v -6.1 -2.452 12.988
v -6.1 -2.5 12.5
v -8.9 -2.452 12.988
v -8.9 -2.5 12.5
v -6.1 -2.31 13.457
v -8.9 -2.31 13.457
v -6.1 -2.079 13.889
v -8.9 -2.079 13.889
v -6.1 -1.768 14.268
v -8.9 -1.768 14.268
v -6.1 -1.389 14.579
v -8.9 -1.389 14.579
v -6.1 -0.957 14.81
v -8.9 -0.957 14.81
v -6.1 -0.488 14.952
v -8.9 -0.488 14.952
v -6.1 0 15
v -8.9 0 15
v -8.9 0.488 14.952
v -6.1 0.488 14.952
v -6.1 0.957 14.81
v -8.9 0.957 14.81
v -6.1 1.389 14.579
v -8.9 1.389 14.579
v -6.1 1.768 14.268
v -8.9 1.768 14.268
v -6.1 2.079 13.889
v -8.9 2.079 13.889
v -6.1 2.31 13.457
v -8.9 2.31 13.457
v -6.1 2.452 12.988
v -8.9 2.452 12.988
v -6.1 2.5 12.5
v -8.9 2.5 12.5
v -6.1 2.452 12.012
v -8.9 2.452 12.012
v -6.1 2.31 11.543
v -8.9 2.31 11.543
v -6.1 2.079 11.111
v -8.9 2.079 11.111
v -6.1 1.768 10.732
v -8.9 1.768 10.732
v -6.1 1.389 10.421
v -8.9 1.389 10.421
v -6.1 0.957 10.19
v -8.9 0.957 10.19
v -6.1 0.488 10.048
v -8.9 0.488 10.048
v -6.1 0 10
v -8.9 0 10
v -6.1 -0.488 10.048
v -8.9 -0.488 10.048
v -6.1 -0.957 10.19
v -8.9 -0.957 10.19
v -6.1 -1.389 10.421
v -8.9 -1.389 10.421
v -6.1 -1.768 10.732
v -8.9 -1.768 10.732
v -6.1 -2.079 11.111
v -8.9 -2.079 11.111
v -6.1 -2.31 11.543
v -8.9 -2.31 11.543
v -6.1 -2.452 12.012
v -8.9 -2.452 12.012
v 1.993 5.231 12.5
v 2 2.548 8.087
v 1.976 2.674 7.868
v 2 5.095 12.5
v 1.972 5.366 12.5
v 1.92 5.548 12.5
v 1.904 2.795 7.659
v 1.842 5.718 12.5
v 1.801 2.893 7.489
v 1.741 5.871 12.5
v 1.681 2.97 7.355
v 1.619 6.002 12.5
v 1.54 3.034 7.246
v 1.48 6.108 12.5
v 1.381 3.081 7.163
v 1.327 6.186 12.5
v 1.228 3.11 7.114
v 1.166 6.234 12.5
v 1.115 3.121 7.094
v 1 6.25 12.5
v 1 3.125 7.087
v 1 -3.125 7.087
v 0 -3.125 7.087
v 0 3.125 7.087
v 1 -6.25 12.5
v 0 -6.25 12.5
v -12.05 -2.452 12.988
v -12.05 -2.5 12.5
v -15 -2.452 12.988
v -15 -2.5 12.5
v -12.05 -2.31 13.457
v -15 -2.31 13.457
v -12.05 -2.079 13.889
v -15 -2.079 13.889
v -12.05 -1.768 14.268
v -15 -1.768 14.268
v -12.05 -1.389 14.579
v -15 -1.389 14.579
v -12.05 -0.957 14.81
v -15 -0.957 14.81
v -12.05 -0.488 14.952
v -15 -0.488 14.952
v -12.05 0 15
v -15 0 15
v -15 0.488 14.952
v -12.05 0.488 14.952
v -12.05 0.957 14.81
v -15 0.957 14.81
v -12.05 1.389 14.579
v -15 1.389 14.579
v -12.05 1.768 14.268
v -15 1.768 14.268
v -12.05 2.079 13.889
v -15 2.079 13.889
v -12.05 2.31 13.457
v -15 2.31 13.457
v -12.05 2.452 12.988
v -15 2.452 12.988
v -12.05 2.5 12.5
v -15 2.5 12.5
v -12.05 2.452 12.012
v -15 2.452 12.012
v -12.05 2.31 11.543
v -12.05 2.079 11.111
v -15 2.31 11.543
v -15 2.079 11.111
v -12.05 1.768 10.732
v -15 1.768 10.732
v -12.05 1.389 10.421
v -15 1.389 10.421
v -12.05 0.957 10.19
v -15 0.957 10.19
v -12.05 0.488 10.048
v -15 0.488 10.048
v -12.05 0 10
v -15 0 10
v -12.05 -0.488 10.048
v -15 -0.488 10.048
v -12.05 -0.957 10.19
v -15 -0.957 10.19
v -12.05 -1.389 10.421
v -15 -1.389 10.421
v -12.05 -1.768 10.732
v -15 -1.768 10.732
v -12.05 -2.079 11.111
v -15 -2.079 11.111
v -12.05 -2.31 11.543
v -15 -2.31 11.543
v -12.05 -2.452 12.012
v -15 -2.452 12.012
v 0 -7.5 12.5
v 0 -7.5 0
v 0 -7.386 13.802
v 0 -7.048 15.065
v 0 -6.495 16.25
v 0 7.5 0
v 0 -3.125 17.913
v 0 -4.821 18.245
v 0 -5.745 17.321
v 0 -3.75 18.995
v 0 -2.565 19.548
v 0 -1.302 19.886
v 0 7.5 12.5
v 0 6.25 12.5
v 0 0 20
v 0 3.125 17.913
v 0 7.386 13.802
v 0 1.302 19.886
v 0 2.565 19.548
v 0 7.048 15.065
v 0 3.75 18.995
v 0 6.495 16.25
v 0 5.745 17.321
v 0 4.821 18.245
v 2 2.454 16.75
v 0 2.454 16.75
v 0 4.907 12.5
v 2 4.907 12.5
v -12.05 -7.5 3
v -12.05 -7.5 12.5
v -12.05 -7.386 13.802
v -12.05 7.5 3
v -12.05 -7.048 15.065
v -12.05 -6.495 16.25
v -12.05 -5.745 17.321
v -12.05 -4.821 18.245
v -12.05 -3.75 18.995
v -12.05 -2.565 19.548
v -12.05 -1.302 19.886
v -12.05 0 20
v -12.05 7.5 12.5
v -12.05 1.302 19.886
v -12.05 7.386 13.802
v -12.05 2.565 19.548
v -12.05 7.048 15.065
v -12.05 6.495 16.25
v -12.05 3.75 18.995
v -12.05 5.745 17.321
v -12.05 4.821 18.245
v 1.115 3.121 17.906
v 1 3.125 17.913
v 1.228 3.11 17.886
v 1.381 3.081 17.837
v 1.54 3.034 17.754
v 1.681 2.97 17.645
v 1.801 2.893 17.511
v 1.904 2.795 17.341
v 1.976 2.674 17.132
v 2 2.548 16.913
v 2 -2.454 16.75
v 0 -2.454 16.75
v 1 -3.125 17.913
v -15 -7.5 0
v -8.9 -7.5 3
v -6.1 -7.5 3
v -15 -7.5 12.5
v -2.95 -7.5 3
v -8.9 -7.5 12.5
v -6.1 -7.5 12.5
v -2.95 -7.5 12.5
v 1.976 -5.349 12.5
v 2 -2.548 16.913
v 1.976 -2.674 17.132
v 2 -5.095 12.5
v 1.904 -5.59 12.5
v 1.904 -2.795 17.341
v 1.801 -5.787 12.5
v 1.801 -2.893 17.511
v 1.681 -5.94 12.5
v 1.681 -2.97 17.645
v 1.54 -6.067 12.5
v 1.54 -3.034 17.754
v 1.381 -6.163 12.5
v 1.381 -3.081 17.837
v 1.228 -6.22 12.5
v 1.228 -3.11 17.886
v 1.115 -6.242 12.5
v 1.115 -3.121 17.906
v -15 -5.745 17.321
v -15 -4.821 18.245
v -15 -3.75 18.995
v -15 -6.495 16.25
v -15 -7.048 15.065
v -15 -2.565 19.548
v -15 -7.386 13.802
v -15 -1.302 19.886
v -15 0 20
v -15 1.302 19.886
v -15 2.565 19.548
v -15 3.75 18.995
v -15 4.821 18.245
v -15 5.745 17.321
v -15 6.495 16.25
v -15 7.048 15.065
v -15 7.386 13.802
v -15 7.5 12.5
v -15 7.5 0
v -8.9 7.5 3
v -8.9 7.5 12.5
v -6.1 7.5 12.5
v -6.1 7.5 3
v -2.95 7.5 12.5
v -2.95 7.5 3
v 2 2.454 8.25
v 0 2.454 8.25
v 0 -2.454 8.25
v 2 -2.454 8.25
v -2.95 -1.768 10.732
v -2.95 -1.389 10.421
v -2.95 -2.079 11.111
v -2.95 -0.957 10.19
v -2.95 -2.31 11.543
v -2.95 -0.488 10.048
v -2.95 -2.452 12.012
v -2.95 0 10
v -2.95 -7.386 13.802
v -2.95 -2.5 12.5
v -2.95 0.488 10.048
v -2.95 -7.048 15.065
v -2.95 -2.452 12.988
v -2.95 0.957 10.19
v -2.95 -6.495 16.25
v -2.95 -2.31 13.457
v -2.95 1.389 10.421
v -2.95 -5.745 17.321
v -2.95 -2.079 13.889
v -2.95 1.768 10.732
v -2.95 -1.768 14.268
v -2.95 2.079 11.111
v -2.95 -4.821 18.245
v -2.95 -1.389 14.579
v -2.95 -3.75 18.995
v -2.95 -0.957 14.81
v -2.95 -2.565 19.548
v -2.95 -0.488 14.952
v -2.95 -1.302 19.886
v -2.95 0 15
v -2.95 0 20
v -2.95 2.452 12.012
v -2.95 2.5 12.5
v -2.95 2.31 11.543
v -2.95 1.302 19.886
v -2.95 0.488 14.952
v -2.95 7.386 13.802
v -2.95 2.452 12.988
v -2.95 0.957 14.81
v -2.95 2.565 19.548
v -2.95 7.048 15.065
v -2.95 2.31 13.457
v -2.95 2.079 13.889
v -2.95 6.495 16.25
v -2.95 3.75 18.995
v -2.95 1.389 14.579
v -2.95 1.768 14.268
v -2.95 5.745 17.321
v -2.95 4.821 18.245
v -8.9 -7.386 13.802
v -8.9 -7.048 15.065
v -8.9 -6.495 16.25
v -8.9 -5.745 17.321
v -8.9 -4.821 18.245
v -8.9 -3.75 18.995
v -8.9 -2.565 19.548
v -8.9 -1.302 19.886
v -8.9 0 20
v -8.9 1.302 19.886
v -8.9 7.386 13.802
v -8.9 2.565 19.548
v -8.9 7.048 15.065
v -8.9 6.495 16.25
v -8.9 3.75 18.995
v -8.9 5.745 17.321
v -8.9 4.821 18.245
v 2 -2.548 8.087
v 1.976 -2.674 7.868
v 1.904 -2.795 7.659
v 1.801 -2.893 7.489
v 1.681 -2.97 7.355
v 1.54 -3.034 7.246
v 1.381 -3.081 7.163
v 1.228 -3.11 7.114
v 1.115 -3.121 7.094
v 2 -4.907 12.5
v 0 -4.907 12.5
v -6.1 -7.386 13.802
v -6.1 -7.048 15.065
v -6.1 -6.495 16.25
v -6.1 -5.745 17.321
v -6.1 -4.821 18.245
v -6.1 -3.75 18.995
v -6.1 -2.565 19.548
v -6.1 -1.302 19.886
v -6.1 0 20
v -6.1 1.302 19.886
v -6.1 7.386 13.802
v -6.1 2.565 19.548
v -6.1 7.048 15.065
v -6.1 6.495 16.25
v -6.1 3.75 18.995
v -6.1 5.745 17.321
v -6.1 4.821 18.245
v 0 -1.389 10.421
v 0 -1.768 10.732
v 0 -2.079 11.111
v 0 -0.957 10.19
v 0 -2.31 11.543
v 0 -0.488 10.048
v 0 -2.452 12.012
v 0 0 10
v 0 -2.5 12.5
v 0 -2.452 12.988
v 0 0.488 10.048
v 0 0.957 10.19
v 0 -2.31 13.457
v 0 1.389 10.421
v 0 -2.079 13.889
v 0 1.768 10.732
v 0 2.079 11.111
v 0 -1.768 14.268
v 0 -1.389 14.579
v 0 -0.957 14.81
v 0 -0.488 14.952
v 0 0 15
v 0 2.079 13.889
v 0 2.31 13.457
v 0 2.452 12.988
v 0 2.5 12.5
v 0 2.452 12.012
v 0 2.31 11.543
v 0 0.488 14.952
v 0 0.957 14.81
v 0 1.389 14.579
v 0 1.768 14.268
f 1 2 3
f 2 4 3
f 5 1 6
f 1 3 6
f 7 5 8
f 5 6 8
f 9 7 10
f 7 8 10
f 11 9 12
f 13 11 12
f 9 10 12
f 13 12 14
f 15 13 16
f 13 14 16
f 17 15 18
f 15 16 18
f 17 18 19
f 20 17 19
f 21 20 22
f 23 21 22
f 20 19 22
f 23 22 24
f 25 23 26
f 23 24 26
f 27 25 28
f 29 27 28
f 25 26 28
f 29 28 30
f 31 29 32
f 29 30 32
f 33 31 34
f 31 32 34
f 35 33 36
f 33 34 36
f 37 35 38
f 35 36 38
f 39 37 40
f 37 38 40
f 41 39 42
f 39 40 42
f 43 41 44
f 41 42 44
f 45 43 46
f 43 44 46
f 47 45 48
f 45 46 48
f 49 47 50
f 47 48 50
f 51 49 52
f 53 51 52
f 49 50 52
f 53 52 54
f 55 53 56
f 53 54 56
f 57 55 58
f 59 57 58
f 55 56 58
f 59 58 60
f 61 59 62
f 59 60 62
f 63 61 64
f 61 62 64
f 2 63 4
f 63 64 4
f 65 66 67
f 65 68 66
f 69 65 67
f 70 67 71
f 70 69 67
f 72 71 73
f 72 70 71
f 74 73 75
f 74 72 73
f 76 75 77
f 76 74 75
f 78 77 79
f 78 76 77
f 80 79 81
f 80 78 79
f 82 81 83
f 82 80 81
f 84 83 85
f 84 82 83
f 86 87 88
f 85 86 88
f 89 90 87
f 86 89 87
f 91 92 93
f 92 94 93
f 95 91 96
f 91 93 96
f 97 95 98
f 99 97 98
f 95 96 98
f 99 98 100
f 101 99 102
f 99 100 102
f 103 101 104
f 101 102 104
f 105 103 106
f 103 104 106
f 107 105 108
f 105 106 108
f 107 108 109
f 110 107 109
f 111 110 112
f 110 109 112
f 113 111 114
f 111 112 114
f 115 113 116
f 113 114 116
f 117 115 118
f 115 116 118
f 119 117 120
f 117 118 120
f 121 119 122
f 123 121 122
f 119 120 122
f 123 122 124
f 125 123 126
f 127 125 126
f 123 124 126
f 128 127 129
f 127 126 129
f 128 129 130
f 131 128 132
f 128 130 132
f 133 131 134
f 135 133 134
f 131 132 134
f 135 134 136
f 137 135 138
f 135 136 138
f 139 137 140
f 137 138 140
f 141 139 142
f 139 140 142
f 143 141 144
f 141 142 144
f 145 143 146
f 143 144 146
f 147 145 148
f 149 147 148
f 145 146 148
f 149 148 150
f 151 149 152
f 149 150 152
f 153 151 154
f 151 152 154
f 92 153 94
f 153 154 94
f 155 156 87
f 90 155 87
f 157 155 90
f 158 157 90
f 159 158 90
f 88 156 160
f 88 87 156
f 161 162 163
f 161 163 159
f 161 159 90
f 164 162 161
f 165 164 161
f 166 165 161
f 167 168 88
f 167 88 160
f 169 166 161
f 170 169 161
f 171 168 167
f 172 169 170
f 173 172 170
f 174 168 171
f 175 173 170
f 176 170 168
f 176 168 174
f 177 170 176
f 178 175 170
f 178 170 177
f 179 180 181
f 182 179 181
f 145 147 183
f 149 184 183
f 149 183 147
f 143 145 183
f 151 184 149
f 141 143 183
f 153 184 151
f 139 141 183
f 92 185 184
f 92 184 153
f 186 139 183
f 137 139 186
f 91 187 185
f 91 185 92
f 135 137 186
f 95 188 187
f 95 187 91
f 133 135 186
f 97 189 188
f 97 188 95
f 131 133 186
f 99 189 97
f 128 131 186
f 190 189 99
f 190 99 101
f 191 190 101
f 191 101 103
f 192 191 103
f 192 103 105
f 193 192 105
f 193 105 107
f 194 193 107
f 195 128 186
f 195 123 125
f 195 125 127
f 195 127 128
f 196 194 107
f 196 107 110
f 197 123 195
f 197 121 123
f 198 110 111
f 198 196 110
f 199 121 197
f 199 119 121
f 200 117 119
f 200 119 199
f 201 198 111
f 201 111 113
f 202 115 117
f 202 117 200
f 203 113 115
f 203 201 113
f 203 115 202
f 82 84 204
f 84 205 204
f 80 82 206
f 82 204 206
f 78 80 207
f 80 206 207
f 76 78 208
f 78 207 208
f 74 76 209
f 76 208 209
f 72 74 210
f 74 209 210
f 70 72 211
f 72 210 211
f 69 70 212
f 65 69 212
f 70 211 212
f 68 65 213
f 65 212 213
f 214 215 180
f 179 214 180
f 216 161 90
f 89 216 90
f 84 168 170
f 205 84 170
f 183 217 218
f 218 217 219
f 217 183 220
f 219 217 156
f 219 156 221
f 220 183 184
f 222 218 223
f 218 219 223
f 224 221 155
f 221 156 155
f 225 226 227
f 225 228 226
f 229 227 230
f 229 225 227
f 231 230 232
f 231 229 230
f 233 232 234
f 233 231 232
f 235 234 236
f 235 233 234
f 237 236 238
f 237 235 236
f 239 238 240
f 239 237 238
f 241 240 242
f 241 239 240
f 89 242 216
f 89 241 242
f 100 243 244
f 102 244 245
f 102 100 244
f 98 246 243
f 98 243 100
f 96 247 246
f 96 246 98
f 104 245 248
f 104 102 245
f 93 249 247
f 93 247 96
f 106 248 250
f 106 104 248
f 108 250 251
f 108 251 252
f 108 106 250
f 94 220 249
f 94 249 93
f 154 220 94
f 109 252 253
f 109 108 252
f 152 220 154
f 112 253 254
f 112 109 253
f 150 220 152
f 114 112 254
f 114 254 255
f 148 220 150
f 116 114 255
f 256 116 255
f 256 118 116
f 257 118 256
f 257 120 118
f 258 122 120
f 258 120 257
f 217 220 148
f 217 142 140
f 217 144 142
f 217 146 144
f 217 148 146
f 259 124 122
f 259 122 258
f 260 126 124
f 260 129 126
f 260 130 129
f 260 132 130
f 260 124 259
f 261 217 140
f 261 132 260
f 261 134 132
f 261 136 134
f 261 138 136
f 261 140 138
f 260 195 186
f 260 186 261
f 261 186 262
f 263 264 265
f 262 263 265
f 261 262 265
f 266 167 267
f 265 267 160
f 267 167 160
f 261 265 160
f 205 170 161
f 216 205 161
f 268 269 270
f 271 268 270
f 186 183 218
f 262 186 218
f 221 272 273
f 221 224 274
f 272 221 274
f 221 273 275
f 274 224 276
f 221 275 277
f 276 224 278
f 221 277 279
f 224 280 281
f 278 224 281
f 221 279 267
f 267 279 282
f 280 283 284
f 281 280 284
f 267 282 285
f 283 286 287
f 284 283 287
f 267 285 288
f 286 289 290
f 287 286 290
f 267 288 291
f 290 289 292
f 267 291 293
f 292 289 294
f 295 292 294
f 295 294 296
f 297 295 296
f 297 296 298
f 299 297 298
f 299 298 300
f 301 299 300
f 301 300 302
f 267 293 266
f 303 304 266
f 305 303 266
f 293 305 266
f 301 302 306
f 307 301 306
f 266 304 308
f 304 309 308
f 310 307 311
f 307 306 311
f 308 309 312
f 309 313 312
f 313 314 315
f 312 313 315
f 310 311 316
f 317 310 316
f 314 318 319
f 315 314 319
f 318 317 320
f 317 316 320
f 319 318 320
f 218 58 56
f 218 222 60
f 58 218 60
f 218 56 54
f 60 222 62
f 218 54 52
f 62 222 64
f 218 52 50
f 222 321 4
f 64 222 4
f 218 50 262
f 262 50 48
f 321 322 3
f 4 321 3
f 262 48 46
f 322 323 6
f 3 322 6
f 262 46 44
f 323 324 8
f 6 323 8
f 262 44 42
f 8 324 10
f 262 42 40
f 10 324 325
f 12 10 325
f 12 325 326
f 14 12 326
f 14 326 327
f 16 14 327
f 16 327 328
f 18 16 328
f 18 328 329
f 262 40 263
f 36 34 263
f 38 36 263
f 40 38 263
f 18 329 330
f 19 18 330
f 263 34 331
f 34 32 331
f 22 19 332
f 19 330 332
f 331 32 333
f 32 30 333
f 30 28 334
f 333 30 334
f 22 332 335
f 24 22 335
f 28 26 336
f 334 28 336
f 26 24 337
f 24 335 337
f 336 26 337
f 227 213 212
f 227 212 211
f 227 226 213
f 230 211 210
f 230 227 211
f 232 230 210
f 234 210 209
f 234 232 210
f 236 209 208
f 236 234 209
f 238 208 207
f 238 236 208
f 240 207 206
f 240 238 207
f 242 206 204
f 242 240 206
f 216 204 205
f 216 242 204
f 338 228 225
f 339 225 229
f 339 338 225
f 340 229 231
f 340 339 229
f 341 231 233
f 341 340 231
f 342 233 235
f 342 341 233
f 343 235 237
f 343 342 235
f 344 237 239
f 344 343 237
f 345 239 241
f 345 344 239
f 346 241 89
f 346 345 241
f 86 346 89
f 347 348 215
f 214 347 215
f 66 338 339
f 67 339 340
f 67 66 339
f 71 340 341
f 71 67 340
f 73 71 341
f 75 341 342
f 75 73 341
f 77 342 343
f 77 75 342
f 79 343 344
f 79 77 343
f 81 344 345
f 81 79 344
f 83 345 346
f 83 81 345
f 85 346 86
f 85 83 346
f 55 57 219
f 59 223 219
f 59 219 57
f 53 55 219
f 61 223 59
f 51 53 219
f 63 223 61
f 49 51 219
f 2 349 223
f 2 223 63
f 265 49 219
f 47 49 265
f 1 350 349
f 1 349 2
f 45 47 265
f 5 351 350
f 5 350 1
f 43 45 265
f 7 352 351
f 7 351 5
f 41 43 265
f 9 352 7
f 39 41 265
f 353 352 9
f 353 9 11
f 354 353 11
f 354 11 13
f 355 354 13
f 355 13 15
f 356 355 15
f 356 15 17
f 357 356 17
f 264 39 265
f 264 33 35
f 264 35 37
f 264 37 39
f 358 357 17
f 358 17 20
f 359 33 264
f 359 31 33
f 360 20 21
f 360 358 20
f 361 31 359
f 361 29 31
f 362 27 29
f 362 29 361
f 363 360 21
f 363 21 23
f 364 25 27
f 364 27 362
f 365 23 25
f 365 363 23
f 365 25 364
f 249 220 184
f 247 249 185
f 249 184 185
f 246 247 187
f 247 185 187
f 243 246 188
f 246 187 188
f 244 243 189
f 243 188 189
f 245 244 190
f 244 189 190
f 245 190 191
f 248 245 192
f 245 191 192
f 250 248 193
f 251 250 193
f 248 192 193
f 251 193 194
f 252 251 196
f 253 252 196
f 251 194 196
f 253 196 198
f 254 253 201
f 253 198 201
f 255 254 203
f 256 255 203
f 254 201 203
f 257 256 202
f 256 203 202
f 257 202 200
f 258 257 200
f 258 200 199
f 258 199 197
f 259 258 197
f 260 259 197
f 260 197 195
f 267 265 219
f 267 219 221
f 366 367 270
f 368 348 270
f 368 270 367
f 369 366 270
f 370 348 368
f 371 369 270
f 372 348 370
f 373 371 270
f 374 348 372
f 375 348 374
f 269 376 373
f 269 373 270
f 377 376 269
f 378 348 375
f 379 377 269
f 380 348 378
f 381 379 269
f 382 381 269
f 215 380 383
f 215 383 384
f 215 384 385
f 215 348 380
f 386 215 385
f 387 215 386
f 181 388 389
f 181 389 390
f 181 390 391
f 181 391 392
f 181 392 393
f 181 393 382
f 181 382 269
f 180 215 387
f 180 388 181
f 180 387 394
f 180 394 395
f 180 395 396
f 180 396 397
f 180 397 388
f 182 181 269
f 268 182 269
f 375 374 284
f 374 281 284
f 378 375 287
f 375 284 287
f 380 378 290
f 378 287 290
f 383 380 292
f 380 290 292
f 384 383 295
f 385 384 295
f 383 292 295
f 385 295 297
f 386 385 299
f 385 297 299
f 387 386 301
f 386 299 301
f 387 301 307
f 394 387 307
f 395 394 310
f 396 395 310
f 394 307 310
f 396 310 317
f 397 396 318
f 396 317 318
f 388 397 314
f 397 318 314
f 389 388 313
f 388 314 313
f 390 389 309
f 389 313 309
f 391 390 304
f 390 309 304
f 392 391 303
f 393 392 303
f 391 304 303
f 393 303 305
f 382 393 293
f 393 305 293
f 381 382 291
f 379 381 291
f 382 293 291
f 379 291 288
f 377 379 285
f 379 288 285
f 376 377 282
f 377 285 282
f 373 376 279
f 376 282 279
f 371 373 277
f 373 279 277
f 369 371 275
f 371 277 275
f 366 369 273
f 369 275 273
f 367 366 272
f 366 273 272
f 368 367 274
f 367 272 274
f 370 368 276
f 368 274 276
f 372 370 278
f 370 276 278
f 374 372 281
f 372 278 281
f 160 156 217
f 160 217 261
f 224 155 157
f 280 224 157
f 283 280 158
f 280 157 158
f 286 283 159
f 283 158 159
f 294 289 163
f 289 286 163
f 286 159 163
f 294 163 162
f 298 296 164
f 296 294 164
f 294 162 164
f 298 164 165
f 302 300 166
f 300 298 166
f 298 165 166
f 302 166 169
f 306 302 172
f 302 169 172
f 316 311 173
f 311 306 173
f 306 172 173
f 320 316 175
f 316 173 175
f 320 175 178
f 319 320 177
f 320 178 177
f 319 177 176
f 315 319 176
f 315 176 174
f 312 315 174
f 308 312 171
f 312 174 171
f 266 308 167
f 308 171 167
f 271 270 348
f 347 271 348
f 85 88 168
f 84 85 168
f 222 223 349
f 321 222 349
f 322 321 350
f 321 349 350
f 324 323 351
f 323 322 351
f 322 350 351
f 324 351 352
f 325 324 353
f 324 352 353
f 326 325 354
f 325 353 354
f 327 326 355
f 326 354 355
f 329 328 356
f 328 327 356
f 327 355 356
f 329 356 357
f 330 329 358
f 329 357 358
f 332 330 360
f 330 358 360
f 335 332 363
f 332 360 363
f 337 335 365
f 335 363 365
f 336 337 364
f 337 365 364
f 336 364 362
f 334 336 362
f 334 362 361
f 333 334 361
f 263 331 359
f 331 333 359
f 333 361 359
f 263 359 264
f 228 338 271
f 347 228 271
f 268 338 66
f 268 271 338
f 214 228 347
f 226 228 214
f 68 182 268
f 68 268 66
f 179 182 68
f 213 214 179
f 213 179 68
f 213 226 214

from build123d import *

# Parameters (mm, degrees)
F0_W      = 15
F0_H      = 3
F1_DEPTH  = 15
F2_DEPTH  = 3
F3_DEPTH  = 3
F4_DEPTH  = 2
F5_DEPTH  = 3
F6_DEPTH  = 12
F7_D      = 5
F7_DEPTH  = 15
F9_W      = 3.15
F9_H      = 15
F10_DEPTH = 17
F11_R     = 1


with BuildPart() as f1:
    # F0 (on Right) → F1 (new body)
    with BuildSketch(Plane.YZ):
        with Locations((0, 1.5)):
            Rectangle(F0_W, F0_H)
    extrude(amount=-F1_DEPTH)

    # F0 (on Right) → F2 (join)
    with BuildSketch(Plane.YZ):
        with BuildLine():
            Line((-7.5, 12.5), (-7.5, 3))
            Line((-7.5, 3), (7.5, 3))
            Line((7.5, 3), (7.5, 12.5))
            ThreePointArc((7.5, 12.5), (0, 20), (-7.5, 12.5))
        make_face()
        Polygon((-6.25, 12.5), (-3.125, 17.912659), (3.125, 17.912659), (6.25, 12.5), (3.125, 7.087341), (-3.125, 7.087341), align=None, mode=Mode.SUBTRACT)
    extrude(amount=-F2_DEPTH)

    # F0 (on Right) → F3 (join)
    with BuildSketch(Plane.YZ):
        Polygon((3.125, 17.912659), (-3.125, 17.912659), (-6.25, 12.5), (-3.125, 7.087341), (3.125, 7.087341), (6.25, 12.5), align=None)
        Polygon((-4.907477, 12.5), (-2.453739, 16.75), (2.453739, 16.75), (4.907477, 12.5), (2.453739, 8.25), (-2.453739, 8.25), align=None, mode=Mode.SUBTRACT)
    extrude(amount=-F3_DEPTH)

    # F0 (on Right) → F4 (join)
    with BuildSketch(Plane.YZ):
        Polygon((3.125, 17.912659), (-3.125, 17.912659), (-6.25, 12.5), (-3.125, 7.087341), (3.125, 7.087341), (6.25, 12.5), align=None)
        Polygon((-4.907477, 12.5), (-2.453739, 16.75), (2.453739, 16.75), (4.907477, 12.5), (2.453739, 8.25), (-2.453739, 8.25), align=None, mode=Mode.SUBTRACT)
    extrude(amount=F4_DEPTH)

    # F0 (on Right) → F5 (join)
    with BuildSketch(Plane.YZ):
        Polygon((2.453739, 16.75), (-2.453739, 16.75), (-4.907477, 12.5), (-2.453739, 8.25), (2.453739, 8.25), (4.907477, 12.5), align=None)
    extrude(amount=-F5_DEPTH)

    # F5_face (on face) → F6 (join)
    with BuildSketch(Plane(origin=(-3, 0, 10.786279), x_dir=(0, 1, 0), z_dir=(-1, 0, 0))):
        with BuildLine():
            Line((-7.5, 7.786279), (-7.5, -1.713721))
            ThreePointArc((-7.5, -1.713721), (0, -9.213721), (7.5, -1.713721))
            Line((7.5, -1.713721), (7.5, 7.786279))
            Line((7.5, 7.786279), (-7.5, 7.786279))
        make_face()
    extrude(amount=F6_DEPTH)

    # F7
    with Locations(Plane.YZ):
        with Locations((0, 12.5)):
            Hole(F7_D / 2, depth=F7_DEPTH)

    # F9 (on offset) → F10 (cut)
    with BuildSketch(Plane.XY.offset(20)):
        with Locations((-10.475, 0)):
            Rectangle(F9_W, F9_H)
        with Locations((-4.525, 0)):
            Rectangle(F9_W, F9_H)
    extrude(amount=-F10_DEPTH, mode=Mode.SUBTRACT)

    # F11
    f11_edges = [f1.edges().sort_by_distance(p)[0] for p in [
        (2, -4.6875, 9.793671),
        (2, 0, 7.087341),
        (2, -4.6875, 15.206329),
        (2, 0, 17.912659),
        (2, 4.6875, 15.206329),
        (2, 4.6875, 9.793671),
    ]]
    fillet(f11_edges, radius=F11_R)


solid = f1.part
